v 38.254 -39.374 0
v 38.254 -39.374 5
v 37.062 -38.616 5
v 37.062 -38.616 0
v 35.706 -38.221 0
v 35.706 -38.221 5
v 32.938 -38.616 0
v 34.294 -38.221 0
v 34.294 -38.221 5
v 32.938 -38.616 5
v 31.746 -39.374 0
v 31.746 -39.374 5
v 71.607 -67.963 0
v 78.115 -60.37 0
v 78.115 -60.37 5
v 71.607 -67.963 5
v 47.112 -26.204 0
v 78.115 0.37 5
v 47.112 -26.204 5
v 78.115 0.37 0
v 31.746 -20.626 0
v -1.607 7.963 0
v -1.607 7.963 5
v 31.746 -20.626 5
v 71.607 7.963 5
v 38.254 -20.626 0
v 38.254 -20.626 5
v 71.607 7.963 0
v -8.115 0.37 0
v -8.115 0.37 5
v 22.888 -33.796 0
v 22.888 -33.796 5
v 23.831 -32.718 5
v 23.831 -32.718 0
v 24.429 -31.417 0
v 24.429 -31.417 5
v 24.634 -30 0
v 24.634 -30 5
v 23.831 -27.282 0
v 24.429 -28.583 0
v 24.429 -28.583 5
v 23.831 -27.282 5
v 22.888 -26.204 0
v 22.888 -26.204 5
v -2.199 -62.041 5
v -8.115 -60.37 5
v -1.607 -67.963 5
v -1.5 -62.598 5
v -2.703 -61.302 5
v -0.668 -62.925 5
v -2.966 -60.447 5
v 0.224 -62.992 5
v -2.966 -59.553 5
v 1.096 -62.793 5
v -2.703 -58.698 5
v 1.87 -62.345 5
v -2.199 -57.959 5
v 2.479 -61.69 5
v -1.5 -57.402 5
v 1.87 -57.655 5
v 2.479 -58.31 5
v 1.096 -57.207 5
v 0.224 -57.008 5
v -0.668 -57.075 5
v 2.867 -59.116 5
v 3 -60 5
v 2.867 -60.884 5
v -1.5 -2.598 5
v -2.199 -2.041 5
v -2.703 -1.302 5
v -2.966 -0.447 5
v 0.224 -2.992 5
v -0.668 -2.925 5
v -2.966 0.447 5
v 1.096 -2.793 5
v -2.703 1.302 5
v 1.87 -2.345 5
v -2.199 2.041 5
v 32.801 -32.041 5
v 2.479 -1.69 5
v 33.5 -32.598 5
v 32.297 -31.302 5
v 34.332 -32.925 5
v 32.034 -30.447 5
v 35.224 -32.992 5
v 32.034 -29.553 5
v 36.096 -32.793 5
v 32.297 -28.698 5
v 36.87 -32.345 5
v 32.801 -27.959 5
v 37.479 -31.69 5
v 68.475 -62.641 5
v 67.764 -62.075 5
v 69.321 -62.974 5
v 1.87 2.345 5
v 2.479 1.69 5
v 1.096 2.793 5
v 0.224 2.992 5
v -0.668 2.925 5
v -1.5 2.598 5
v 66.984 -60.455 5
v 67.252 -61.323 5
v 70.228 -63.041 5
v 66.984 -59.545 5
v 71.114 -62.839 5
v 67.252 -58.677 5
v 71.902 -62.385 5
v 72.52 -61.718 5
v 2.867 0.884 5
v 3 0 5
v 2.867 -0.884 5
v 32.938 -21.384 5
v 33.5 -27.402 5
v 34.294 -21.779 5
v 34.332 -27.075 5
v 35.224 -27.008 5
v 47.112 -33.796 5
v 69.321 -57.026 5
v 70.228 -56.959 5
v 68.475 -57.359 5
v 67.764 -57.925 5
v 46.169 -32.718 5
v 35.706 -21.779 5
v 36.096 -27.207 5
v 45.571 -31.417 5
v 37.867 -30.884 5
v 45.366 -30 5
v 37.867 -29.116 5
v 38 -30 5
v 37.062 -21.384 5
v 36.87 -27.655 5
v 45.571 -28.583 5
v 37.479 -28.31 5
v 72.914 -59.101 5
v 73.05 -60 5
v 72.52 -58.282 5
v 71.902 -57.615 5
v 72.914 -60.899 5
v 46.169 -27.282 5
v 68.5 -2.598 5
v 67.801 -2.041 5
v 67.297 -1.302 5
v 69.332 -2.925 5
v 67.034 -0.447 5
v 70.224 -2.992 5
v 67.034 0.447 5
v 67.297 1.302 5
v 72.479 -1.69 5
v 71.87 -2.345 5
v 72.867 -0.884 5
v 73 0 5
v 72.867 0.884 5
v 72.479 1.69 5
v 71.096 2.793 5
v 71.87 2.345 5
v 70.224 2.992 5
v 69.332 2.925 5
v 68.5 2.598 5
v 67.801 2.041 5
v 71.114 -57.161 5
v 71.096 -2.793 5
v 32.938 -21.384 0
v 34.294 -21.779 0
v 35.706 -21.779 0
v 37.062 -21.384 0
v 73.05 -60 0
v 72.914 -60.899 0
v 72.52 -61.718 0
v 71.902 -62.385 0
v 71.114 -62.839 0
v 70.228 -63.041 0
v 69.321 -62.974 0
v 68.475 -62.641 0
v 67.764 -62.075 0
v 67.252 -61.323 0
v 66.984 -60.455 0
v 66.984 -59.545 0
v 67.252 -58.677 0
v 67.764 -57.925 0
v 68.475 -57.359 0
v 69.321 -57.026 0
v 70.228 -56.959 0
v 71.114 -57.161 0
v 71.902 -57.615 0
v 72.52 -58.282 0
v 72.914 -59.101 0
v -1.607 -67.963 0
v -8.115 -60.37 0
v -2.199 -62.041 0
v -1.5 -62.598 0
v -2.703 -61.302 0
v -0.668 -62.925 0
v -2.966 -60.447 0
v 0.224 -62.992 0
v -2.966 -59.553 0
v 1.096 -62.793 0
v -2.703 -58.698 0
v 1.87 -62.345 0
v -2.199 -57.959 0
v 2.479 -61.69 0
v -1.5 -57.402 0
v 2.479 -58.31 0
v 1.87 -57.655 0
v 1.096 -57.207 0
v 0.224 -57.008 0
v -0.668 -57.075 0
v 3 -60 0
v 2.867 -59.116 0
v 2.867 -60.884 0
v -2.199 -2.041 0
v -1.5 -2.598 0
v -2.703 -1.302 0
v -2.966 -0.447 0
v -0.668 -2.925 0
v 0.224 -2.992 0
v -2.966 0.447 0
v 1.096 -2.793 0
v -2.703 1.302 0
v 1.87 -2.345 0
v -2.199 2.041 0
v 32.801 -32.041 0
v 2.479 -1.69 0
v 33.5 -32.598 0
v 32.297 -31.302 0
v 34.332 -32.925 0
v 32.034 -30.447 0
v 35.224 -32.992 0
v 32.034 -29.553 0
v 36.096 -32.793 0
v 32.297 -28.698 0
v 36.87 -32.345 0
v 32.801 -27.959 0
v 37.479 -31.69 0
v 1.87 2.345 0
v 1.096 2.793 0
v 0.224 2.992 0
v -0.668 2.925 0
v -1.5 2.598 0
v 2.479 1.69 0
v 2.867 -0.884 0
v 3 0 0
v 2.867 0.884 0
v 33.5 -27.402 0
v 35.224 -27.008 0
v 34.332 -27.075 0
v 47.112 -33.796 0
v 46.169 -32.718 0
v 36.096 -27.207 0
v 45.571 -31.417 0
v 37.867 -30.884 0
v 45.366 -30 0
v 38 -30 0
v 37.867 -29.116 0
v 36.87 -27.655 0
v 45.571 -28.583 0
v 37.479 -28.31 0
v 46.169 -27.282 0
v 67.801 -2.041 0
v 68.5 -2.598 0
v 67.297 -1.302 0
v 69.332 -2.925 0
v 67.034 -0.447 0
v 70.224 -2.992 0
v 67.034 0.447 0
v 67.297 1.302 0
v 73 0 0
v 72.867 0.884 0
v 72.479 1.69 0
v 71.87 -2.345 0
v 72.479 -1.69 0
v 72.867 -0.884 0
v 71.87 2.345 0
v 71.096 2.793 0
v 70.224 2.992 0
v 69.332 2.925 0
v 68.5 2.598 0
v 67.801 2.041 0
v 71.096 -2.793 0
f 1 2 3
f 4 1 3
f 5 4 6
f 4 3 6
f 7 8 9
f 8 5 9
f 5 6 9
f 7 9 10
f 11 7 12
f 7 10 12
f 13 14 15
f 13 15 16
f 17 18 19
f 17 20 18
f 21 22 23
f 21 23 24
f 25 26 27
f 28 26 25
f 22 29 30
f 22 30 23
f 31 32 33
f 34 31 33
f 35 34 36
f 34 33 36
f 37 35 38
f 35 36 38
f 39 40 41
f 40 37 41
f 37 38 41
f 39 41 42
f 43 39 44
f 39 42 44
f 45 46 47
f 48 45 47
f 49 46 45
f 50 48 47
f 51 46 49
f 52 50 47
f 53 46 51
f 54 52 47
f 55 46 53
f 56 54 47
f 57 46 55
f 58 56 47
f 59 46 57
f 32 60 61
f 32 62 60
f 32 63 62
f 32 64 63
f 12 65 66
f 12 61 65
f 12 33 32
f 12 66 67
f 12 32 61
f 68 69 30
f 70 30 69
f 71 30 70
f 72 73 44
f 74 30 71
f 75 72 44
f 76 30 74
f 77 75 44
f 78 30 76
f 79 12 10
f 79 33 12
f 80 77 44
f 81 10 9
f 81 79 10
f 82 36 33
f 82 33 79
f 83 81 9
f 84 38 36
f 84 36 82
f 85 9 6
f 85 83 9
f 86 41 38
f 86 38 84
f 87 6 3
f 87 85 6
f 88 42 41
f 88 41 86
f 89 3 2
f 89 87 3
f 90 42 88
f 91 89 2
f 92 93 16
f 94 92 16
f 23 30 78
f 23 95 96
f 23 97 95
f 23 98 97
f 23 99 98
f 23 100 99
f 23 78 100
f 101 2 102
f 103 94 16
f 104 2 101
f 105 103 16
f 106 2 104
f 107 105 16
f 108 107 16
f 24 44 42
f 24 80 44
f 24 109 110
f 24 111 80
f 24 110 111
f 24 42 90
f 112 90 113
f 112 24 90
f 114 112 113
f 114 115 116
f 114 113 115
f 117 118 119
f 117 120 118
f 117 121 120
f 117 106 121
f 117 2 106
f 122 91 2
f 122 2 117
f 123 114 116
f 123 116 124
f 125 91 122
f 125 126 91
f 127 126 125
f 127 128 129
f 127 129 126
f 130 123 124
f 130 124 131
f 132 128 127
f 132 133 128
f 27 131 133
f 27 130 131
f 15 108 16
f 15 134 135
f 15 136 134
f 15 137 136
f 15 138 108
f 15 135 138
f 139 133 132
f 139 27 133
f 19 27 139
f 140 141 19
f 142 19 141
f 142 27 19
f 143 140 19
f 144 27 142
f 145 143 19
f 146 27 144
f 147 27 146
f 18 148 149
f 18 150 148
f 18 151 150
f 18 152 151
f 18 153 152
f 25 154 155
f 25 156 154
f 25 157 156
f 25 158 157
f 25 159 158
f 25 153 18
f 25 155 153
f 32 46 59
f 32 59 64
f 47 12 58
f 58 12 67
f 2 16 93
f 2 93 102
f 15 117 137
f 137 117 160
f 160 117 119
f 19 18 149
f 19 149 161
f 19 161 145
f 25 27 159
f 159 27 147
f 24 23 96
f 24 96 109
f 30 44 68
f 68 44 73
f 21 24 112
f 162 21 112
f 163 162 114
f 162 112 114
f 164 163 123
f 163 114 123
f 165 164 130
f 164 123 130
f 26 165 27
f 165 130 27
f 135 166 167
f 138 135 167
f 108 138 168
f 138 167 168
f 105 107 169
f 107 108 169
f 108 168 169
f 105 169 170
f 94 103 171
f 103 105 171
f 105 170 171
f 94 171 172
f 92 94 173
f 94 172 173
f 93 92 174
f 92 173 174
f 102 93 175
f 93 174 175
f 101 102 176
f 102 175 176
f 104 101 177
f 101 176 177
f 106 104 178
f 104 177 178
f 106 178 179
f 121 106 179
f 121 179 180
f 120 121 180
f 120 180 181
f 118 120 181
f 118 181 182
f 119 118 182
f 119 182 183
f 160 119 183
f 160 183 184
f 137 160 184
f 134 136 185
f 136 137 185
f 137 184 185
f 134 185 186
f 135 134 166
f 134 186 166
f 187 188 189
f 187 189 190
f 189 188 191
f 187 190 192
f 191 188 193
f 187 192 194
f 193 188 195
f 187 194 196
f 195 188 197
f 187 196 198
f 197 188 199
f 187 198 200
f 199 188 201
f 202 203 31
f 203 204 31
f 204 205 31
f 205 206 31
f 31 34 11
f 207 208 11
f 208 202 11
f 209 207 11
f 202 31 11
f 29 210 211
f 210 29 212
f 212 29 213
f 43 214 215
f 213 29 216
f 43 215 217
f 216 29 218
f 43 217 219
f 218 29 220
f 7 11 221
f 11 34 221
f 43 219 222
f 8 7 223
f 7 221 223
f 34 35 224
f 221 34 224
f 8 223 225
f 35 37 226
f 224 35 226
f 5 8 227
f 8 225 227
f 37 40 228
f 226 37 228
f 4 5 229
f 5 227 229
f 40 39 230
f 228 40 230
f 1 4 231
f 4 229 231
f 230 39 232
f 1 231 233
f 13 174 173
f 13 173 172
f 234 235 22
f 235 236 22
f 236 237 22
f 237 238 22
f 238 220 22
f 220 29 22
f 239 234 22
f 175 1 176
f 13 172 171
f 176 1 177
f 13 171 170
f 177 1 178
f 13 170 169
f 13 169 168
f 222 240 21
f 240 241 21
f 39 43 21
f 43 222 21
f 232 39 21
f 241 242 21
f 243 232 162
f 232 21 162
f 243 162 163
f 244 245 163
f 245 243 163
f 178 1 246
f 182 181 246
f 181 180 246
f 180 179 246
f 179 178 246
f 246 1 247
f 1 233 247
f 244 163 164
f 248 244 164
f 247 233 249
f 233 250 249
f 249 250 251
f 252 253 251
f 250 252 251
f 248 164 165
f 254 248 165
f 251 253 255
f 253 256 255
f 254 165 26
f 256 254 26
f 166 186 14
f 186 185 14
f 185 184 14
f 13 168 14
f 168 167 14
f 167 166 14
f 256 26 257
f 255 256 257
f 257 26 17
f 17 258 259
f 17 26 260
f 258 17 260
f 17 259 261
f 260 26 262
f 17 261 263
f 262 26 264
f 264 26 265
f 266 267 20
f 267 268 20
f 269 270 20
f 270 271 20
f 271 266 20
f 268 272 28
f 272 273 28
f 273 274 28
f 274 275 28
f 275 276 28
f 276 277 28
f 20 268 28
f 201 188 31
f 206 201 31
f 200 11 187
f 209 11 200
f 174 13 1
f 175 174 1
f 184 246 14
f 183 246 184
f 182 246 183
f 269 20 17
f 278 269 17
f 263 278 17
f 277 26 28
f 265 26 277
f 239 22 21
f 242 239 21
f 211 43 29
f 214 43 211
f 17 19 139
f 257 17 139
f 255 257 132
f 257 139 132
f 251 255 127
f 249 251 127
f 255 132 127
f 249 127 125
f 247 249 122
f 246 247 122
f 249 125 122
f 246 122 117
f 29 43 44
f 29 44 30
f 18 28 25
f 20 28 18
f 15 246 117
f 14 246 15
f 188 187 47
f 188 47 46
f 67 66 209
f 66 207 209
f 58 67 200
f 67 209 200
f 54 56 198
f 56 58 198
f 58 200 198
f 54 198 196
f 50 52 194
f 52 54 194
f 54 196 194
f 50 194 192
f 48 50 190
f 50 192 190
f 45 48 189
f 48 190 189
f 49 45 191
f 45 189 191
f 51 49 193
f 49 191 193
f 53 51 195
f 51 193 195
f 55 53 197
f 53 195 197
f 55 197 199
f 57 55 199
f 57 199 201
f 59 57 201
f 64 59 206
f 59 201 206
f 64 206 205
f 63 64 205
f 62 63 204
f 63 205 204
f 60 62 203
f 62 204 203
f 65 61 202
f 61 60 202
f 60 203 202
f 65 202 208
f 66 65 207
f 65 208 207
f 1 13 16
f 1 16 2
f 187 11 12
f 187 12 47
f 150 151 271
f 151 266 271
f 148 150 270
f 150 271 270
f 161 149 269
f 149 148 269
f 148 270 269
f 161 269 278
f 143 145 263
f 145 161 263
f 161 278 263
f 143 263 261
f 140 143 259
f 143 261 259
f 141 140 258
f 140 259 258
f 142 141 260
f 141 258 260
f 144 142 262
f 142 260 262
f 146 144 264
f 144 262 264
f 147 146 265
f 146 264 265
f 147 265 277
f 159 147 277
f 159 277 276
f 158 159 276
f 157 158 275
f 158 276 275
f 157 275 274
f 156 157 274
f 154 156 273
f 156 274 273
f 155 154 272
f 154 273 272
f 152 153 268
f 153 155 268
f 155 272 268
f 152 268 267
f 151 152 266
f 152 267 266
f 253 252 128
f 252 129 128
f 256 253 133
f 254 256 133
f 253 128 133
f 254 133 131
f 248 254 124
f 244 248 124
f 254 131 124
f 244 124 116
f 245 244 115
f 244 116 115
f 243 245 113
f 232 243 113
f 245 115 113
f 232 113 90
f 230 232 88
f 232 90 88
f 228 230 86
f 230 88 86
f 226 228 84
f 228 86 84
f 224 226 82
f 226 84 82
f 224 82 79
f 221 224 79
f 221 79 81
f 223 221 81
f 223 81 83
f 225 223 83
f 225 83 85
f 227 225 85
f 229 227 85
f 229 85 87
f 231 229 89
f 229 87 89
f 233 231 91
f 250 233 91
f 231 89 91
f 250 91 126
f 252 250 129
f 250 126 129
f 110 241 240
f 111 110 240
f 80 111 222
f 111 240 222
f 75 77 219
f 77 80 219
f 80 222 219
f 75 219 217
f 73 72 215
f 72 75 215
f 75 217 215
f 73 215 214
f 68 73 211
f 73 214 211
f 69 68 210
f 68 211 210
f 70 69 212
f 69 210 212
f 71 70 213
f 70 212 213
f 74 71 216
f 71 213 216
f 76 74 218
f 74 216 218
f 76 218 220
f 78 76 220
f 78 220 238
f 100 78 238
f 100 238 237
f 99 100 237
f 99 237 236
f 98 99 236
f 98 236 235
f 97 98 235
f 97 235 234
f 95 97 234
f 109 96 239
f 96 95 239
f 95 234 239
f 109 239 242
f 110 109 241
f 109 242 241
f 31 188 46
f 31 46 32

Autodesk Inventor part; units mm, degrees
ref_plane "YZ Plane" through (0, 0, 0) normal (1, 0, 0) x (0, 1, 0)
ref_plane "XZ Plane" through (0, 0, 0) normal (0, 1, 0) x (-1, 0, 0)
ref_plane "XY Plane" through (0, 0, 0) normal (0, 0, 1) x (1, 0, 0)
sketch "Sketch1" plane through (0, 0, 0) normal (0, 0, 1) x (1, 0, 0)
  circle A0 centre (0, 0) radius 3 projected
  circle A1 centre (0, -60) radius 3 projected
  circle A2 centre (70, 0) radius 3 projected
  circle A3 centre (70, -60) radius 3.05 projected
  circle A4 centre (37.1599, -42) radius 6.15 construction
  line L0 (70, 0) -> (0, -60) construction
  line L1 (70, -60) -> (0, 0) construction
  circle A5 centre (35, -30) radius 2.5 construction
  line L2 (-1.607, 7.9628) -> (78.1149, -60.3703)
  line L3 (78.1149, -60.3703) -> (71.607, -67.9628)
  line L4 (71.607, -67.9628) -> (-8.1149, 0.3703)
  line L5 (-8.1149, 0.3703) -> (-1.607, 7.9628)
  line L6 (-1.607, 7.9628) -> (71.607, -67.9628) construction
  line L7 (78.1149, -60.3703) -> (-8.1149, 0.3703) construction
  line L8 (78.1149, 0.3703) -> (-1.607, -67.9628)
  line L9 (-1.607, -67.9628) -> (-8.1149, -60.3703)
  line L10 (-8.1149, -60.3703) -> (71.607, 7.9628)
  line L11 (71.607, 7.9628) -> (78.1149, 0.3703)
  line L12 (78.1149, 0.3703) -> (-8.1149, -60.3703) construction
  line L13 (-1.607, -67.9628) -> (71.607, 7.9628) construction
  point P0 (0, 0)
  dimension "d0" = 5
  dimension "d1" = 105
  dimension "d2" = 10
  dimension "d3" = 105
  dimension "d4" = 10
extrude "Extrusion1" add sketch "Sketch1" along normal blind 5
sketch "Sketch2" plane through (0, 0, 5) normal (0, 0, 1) x (1, 0, 0)
  circle A0 centre (0, -60) radius 3 projected
  circle A1 centre (70, 0) radius 3 projected
  circle A2 centre (70, -60) radius 3.05 projected
  circle A3 centre (0, 0) radius 3 projected
  line L0 (35, -23.4146) -> (-1.607, 7.9628) projected
  line L1 (-1.607, 7.9628) -> (-8.1149, 0.3703) projected
  line L2 (-8.1149, 0.3703) -> (27.317, -30) projected
  line L3 (27.317, -30) -> (-8.1149, -60.3703) projected
  line L4 (-8.1149, -60.3703) -> (-1.607, -67.9628) projected
  line L5 (-1.607, -67.9628) -> (35, -36.5854) projected
  line L6 (35, -36.5854) -> (71.607, -67.9628) projected
  line L7 (71.607, -67.9628) -> (78.1149, -60.3703) projected
  line L8 (78.1149, -60.3703) -> (42.683, -30) projected
  line L9 (42.683, -30) -> (78.1149, 0.3703) projected
  line L10 (78.1149, 0.3703) -> (71.607, 7.9628) projected
  line L11 (71.607, 7.9628) -> (35, -23.4146) projected
  circle A4 centre (35, -30) radius 3
  point P0 (0, 0)
  dimension "d7" = 6
extrude "Extrusion2" cut sketch "Sketch2" against normal through all contours A4
fillet "Fillet1" radius 5 4 edges at (35, -23.4146, 2.5) (27.317, -30, 2.5) (35, -36.5854, 2.5) (42.683, -30, 2.5)
properties part number "cellSTORM_inverted_LED"
